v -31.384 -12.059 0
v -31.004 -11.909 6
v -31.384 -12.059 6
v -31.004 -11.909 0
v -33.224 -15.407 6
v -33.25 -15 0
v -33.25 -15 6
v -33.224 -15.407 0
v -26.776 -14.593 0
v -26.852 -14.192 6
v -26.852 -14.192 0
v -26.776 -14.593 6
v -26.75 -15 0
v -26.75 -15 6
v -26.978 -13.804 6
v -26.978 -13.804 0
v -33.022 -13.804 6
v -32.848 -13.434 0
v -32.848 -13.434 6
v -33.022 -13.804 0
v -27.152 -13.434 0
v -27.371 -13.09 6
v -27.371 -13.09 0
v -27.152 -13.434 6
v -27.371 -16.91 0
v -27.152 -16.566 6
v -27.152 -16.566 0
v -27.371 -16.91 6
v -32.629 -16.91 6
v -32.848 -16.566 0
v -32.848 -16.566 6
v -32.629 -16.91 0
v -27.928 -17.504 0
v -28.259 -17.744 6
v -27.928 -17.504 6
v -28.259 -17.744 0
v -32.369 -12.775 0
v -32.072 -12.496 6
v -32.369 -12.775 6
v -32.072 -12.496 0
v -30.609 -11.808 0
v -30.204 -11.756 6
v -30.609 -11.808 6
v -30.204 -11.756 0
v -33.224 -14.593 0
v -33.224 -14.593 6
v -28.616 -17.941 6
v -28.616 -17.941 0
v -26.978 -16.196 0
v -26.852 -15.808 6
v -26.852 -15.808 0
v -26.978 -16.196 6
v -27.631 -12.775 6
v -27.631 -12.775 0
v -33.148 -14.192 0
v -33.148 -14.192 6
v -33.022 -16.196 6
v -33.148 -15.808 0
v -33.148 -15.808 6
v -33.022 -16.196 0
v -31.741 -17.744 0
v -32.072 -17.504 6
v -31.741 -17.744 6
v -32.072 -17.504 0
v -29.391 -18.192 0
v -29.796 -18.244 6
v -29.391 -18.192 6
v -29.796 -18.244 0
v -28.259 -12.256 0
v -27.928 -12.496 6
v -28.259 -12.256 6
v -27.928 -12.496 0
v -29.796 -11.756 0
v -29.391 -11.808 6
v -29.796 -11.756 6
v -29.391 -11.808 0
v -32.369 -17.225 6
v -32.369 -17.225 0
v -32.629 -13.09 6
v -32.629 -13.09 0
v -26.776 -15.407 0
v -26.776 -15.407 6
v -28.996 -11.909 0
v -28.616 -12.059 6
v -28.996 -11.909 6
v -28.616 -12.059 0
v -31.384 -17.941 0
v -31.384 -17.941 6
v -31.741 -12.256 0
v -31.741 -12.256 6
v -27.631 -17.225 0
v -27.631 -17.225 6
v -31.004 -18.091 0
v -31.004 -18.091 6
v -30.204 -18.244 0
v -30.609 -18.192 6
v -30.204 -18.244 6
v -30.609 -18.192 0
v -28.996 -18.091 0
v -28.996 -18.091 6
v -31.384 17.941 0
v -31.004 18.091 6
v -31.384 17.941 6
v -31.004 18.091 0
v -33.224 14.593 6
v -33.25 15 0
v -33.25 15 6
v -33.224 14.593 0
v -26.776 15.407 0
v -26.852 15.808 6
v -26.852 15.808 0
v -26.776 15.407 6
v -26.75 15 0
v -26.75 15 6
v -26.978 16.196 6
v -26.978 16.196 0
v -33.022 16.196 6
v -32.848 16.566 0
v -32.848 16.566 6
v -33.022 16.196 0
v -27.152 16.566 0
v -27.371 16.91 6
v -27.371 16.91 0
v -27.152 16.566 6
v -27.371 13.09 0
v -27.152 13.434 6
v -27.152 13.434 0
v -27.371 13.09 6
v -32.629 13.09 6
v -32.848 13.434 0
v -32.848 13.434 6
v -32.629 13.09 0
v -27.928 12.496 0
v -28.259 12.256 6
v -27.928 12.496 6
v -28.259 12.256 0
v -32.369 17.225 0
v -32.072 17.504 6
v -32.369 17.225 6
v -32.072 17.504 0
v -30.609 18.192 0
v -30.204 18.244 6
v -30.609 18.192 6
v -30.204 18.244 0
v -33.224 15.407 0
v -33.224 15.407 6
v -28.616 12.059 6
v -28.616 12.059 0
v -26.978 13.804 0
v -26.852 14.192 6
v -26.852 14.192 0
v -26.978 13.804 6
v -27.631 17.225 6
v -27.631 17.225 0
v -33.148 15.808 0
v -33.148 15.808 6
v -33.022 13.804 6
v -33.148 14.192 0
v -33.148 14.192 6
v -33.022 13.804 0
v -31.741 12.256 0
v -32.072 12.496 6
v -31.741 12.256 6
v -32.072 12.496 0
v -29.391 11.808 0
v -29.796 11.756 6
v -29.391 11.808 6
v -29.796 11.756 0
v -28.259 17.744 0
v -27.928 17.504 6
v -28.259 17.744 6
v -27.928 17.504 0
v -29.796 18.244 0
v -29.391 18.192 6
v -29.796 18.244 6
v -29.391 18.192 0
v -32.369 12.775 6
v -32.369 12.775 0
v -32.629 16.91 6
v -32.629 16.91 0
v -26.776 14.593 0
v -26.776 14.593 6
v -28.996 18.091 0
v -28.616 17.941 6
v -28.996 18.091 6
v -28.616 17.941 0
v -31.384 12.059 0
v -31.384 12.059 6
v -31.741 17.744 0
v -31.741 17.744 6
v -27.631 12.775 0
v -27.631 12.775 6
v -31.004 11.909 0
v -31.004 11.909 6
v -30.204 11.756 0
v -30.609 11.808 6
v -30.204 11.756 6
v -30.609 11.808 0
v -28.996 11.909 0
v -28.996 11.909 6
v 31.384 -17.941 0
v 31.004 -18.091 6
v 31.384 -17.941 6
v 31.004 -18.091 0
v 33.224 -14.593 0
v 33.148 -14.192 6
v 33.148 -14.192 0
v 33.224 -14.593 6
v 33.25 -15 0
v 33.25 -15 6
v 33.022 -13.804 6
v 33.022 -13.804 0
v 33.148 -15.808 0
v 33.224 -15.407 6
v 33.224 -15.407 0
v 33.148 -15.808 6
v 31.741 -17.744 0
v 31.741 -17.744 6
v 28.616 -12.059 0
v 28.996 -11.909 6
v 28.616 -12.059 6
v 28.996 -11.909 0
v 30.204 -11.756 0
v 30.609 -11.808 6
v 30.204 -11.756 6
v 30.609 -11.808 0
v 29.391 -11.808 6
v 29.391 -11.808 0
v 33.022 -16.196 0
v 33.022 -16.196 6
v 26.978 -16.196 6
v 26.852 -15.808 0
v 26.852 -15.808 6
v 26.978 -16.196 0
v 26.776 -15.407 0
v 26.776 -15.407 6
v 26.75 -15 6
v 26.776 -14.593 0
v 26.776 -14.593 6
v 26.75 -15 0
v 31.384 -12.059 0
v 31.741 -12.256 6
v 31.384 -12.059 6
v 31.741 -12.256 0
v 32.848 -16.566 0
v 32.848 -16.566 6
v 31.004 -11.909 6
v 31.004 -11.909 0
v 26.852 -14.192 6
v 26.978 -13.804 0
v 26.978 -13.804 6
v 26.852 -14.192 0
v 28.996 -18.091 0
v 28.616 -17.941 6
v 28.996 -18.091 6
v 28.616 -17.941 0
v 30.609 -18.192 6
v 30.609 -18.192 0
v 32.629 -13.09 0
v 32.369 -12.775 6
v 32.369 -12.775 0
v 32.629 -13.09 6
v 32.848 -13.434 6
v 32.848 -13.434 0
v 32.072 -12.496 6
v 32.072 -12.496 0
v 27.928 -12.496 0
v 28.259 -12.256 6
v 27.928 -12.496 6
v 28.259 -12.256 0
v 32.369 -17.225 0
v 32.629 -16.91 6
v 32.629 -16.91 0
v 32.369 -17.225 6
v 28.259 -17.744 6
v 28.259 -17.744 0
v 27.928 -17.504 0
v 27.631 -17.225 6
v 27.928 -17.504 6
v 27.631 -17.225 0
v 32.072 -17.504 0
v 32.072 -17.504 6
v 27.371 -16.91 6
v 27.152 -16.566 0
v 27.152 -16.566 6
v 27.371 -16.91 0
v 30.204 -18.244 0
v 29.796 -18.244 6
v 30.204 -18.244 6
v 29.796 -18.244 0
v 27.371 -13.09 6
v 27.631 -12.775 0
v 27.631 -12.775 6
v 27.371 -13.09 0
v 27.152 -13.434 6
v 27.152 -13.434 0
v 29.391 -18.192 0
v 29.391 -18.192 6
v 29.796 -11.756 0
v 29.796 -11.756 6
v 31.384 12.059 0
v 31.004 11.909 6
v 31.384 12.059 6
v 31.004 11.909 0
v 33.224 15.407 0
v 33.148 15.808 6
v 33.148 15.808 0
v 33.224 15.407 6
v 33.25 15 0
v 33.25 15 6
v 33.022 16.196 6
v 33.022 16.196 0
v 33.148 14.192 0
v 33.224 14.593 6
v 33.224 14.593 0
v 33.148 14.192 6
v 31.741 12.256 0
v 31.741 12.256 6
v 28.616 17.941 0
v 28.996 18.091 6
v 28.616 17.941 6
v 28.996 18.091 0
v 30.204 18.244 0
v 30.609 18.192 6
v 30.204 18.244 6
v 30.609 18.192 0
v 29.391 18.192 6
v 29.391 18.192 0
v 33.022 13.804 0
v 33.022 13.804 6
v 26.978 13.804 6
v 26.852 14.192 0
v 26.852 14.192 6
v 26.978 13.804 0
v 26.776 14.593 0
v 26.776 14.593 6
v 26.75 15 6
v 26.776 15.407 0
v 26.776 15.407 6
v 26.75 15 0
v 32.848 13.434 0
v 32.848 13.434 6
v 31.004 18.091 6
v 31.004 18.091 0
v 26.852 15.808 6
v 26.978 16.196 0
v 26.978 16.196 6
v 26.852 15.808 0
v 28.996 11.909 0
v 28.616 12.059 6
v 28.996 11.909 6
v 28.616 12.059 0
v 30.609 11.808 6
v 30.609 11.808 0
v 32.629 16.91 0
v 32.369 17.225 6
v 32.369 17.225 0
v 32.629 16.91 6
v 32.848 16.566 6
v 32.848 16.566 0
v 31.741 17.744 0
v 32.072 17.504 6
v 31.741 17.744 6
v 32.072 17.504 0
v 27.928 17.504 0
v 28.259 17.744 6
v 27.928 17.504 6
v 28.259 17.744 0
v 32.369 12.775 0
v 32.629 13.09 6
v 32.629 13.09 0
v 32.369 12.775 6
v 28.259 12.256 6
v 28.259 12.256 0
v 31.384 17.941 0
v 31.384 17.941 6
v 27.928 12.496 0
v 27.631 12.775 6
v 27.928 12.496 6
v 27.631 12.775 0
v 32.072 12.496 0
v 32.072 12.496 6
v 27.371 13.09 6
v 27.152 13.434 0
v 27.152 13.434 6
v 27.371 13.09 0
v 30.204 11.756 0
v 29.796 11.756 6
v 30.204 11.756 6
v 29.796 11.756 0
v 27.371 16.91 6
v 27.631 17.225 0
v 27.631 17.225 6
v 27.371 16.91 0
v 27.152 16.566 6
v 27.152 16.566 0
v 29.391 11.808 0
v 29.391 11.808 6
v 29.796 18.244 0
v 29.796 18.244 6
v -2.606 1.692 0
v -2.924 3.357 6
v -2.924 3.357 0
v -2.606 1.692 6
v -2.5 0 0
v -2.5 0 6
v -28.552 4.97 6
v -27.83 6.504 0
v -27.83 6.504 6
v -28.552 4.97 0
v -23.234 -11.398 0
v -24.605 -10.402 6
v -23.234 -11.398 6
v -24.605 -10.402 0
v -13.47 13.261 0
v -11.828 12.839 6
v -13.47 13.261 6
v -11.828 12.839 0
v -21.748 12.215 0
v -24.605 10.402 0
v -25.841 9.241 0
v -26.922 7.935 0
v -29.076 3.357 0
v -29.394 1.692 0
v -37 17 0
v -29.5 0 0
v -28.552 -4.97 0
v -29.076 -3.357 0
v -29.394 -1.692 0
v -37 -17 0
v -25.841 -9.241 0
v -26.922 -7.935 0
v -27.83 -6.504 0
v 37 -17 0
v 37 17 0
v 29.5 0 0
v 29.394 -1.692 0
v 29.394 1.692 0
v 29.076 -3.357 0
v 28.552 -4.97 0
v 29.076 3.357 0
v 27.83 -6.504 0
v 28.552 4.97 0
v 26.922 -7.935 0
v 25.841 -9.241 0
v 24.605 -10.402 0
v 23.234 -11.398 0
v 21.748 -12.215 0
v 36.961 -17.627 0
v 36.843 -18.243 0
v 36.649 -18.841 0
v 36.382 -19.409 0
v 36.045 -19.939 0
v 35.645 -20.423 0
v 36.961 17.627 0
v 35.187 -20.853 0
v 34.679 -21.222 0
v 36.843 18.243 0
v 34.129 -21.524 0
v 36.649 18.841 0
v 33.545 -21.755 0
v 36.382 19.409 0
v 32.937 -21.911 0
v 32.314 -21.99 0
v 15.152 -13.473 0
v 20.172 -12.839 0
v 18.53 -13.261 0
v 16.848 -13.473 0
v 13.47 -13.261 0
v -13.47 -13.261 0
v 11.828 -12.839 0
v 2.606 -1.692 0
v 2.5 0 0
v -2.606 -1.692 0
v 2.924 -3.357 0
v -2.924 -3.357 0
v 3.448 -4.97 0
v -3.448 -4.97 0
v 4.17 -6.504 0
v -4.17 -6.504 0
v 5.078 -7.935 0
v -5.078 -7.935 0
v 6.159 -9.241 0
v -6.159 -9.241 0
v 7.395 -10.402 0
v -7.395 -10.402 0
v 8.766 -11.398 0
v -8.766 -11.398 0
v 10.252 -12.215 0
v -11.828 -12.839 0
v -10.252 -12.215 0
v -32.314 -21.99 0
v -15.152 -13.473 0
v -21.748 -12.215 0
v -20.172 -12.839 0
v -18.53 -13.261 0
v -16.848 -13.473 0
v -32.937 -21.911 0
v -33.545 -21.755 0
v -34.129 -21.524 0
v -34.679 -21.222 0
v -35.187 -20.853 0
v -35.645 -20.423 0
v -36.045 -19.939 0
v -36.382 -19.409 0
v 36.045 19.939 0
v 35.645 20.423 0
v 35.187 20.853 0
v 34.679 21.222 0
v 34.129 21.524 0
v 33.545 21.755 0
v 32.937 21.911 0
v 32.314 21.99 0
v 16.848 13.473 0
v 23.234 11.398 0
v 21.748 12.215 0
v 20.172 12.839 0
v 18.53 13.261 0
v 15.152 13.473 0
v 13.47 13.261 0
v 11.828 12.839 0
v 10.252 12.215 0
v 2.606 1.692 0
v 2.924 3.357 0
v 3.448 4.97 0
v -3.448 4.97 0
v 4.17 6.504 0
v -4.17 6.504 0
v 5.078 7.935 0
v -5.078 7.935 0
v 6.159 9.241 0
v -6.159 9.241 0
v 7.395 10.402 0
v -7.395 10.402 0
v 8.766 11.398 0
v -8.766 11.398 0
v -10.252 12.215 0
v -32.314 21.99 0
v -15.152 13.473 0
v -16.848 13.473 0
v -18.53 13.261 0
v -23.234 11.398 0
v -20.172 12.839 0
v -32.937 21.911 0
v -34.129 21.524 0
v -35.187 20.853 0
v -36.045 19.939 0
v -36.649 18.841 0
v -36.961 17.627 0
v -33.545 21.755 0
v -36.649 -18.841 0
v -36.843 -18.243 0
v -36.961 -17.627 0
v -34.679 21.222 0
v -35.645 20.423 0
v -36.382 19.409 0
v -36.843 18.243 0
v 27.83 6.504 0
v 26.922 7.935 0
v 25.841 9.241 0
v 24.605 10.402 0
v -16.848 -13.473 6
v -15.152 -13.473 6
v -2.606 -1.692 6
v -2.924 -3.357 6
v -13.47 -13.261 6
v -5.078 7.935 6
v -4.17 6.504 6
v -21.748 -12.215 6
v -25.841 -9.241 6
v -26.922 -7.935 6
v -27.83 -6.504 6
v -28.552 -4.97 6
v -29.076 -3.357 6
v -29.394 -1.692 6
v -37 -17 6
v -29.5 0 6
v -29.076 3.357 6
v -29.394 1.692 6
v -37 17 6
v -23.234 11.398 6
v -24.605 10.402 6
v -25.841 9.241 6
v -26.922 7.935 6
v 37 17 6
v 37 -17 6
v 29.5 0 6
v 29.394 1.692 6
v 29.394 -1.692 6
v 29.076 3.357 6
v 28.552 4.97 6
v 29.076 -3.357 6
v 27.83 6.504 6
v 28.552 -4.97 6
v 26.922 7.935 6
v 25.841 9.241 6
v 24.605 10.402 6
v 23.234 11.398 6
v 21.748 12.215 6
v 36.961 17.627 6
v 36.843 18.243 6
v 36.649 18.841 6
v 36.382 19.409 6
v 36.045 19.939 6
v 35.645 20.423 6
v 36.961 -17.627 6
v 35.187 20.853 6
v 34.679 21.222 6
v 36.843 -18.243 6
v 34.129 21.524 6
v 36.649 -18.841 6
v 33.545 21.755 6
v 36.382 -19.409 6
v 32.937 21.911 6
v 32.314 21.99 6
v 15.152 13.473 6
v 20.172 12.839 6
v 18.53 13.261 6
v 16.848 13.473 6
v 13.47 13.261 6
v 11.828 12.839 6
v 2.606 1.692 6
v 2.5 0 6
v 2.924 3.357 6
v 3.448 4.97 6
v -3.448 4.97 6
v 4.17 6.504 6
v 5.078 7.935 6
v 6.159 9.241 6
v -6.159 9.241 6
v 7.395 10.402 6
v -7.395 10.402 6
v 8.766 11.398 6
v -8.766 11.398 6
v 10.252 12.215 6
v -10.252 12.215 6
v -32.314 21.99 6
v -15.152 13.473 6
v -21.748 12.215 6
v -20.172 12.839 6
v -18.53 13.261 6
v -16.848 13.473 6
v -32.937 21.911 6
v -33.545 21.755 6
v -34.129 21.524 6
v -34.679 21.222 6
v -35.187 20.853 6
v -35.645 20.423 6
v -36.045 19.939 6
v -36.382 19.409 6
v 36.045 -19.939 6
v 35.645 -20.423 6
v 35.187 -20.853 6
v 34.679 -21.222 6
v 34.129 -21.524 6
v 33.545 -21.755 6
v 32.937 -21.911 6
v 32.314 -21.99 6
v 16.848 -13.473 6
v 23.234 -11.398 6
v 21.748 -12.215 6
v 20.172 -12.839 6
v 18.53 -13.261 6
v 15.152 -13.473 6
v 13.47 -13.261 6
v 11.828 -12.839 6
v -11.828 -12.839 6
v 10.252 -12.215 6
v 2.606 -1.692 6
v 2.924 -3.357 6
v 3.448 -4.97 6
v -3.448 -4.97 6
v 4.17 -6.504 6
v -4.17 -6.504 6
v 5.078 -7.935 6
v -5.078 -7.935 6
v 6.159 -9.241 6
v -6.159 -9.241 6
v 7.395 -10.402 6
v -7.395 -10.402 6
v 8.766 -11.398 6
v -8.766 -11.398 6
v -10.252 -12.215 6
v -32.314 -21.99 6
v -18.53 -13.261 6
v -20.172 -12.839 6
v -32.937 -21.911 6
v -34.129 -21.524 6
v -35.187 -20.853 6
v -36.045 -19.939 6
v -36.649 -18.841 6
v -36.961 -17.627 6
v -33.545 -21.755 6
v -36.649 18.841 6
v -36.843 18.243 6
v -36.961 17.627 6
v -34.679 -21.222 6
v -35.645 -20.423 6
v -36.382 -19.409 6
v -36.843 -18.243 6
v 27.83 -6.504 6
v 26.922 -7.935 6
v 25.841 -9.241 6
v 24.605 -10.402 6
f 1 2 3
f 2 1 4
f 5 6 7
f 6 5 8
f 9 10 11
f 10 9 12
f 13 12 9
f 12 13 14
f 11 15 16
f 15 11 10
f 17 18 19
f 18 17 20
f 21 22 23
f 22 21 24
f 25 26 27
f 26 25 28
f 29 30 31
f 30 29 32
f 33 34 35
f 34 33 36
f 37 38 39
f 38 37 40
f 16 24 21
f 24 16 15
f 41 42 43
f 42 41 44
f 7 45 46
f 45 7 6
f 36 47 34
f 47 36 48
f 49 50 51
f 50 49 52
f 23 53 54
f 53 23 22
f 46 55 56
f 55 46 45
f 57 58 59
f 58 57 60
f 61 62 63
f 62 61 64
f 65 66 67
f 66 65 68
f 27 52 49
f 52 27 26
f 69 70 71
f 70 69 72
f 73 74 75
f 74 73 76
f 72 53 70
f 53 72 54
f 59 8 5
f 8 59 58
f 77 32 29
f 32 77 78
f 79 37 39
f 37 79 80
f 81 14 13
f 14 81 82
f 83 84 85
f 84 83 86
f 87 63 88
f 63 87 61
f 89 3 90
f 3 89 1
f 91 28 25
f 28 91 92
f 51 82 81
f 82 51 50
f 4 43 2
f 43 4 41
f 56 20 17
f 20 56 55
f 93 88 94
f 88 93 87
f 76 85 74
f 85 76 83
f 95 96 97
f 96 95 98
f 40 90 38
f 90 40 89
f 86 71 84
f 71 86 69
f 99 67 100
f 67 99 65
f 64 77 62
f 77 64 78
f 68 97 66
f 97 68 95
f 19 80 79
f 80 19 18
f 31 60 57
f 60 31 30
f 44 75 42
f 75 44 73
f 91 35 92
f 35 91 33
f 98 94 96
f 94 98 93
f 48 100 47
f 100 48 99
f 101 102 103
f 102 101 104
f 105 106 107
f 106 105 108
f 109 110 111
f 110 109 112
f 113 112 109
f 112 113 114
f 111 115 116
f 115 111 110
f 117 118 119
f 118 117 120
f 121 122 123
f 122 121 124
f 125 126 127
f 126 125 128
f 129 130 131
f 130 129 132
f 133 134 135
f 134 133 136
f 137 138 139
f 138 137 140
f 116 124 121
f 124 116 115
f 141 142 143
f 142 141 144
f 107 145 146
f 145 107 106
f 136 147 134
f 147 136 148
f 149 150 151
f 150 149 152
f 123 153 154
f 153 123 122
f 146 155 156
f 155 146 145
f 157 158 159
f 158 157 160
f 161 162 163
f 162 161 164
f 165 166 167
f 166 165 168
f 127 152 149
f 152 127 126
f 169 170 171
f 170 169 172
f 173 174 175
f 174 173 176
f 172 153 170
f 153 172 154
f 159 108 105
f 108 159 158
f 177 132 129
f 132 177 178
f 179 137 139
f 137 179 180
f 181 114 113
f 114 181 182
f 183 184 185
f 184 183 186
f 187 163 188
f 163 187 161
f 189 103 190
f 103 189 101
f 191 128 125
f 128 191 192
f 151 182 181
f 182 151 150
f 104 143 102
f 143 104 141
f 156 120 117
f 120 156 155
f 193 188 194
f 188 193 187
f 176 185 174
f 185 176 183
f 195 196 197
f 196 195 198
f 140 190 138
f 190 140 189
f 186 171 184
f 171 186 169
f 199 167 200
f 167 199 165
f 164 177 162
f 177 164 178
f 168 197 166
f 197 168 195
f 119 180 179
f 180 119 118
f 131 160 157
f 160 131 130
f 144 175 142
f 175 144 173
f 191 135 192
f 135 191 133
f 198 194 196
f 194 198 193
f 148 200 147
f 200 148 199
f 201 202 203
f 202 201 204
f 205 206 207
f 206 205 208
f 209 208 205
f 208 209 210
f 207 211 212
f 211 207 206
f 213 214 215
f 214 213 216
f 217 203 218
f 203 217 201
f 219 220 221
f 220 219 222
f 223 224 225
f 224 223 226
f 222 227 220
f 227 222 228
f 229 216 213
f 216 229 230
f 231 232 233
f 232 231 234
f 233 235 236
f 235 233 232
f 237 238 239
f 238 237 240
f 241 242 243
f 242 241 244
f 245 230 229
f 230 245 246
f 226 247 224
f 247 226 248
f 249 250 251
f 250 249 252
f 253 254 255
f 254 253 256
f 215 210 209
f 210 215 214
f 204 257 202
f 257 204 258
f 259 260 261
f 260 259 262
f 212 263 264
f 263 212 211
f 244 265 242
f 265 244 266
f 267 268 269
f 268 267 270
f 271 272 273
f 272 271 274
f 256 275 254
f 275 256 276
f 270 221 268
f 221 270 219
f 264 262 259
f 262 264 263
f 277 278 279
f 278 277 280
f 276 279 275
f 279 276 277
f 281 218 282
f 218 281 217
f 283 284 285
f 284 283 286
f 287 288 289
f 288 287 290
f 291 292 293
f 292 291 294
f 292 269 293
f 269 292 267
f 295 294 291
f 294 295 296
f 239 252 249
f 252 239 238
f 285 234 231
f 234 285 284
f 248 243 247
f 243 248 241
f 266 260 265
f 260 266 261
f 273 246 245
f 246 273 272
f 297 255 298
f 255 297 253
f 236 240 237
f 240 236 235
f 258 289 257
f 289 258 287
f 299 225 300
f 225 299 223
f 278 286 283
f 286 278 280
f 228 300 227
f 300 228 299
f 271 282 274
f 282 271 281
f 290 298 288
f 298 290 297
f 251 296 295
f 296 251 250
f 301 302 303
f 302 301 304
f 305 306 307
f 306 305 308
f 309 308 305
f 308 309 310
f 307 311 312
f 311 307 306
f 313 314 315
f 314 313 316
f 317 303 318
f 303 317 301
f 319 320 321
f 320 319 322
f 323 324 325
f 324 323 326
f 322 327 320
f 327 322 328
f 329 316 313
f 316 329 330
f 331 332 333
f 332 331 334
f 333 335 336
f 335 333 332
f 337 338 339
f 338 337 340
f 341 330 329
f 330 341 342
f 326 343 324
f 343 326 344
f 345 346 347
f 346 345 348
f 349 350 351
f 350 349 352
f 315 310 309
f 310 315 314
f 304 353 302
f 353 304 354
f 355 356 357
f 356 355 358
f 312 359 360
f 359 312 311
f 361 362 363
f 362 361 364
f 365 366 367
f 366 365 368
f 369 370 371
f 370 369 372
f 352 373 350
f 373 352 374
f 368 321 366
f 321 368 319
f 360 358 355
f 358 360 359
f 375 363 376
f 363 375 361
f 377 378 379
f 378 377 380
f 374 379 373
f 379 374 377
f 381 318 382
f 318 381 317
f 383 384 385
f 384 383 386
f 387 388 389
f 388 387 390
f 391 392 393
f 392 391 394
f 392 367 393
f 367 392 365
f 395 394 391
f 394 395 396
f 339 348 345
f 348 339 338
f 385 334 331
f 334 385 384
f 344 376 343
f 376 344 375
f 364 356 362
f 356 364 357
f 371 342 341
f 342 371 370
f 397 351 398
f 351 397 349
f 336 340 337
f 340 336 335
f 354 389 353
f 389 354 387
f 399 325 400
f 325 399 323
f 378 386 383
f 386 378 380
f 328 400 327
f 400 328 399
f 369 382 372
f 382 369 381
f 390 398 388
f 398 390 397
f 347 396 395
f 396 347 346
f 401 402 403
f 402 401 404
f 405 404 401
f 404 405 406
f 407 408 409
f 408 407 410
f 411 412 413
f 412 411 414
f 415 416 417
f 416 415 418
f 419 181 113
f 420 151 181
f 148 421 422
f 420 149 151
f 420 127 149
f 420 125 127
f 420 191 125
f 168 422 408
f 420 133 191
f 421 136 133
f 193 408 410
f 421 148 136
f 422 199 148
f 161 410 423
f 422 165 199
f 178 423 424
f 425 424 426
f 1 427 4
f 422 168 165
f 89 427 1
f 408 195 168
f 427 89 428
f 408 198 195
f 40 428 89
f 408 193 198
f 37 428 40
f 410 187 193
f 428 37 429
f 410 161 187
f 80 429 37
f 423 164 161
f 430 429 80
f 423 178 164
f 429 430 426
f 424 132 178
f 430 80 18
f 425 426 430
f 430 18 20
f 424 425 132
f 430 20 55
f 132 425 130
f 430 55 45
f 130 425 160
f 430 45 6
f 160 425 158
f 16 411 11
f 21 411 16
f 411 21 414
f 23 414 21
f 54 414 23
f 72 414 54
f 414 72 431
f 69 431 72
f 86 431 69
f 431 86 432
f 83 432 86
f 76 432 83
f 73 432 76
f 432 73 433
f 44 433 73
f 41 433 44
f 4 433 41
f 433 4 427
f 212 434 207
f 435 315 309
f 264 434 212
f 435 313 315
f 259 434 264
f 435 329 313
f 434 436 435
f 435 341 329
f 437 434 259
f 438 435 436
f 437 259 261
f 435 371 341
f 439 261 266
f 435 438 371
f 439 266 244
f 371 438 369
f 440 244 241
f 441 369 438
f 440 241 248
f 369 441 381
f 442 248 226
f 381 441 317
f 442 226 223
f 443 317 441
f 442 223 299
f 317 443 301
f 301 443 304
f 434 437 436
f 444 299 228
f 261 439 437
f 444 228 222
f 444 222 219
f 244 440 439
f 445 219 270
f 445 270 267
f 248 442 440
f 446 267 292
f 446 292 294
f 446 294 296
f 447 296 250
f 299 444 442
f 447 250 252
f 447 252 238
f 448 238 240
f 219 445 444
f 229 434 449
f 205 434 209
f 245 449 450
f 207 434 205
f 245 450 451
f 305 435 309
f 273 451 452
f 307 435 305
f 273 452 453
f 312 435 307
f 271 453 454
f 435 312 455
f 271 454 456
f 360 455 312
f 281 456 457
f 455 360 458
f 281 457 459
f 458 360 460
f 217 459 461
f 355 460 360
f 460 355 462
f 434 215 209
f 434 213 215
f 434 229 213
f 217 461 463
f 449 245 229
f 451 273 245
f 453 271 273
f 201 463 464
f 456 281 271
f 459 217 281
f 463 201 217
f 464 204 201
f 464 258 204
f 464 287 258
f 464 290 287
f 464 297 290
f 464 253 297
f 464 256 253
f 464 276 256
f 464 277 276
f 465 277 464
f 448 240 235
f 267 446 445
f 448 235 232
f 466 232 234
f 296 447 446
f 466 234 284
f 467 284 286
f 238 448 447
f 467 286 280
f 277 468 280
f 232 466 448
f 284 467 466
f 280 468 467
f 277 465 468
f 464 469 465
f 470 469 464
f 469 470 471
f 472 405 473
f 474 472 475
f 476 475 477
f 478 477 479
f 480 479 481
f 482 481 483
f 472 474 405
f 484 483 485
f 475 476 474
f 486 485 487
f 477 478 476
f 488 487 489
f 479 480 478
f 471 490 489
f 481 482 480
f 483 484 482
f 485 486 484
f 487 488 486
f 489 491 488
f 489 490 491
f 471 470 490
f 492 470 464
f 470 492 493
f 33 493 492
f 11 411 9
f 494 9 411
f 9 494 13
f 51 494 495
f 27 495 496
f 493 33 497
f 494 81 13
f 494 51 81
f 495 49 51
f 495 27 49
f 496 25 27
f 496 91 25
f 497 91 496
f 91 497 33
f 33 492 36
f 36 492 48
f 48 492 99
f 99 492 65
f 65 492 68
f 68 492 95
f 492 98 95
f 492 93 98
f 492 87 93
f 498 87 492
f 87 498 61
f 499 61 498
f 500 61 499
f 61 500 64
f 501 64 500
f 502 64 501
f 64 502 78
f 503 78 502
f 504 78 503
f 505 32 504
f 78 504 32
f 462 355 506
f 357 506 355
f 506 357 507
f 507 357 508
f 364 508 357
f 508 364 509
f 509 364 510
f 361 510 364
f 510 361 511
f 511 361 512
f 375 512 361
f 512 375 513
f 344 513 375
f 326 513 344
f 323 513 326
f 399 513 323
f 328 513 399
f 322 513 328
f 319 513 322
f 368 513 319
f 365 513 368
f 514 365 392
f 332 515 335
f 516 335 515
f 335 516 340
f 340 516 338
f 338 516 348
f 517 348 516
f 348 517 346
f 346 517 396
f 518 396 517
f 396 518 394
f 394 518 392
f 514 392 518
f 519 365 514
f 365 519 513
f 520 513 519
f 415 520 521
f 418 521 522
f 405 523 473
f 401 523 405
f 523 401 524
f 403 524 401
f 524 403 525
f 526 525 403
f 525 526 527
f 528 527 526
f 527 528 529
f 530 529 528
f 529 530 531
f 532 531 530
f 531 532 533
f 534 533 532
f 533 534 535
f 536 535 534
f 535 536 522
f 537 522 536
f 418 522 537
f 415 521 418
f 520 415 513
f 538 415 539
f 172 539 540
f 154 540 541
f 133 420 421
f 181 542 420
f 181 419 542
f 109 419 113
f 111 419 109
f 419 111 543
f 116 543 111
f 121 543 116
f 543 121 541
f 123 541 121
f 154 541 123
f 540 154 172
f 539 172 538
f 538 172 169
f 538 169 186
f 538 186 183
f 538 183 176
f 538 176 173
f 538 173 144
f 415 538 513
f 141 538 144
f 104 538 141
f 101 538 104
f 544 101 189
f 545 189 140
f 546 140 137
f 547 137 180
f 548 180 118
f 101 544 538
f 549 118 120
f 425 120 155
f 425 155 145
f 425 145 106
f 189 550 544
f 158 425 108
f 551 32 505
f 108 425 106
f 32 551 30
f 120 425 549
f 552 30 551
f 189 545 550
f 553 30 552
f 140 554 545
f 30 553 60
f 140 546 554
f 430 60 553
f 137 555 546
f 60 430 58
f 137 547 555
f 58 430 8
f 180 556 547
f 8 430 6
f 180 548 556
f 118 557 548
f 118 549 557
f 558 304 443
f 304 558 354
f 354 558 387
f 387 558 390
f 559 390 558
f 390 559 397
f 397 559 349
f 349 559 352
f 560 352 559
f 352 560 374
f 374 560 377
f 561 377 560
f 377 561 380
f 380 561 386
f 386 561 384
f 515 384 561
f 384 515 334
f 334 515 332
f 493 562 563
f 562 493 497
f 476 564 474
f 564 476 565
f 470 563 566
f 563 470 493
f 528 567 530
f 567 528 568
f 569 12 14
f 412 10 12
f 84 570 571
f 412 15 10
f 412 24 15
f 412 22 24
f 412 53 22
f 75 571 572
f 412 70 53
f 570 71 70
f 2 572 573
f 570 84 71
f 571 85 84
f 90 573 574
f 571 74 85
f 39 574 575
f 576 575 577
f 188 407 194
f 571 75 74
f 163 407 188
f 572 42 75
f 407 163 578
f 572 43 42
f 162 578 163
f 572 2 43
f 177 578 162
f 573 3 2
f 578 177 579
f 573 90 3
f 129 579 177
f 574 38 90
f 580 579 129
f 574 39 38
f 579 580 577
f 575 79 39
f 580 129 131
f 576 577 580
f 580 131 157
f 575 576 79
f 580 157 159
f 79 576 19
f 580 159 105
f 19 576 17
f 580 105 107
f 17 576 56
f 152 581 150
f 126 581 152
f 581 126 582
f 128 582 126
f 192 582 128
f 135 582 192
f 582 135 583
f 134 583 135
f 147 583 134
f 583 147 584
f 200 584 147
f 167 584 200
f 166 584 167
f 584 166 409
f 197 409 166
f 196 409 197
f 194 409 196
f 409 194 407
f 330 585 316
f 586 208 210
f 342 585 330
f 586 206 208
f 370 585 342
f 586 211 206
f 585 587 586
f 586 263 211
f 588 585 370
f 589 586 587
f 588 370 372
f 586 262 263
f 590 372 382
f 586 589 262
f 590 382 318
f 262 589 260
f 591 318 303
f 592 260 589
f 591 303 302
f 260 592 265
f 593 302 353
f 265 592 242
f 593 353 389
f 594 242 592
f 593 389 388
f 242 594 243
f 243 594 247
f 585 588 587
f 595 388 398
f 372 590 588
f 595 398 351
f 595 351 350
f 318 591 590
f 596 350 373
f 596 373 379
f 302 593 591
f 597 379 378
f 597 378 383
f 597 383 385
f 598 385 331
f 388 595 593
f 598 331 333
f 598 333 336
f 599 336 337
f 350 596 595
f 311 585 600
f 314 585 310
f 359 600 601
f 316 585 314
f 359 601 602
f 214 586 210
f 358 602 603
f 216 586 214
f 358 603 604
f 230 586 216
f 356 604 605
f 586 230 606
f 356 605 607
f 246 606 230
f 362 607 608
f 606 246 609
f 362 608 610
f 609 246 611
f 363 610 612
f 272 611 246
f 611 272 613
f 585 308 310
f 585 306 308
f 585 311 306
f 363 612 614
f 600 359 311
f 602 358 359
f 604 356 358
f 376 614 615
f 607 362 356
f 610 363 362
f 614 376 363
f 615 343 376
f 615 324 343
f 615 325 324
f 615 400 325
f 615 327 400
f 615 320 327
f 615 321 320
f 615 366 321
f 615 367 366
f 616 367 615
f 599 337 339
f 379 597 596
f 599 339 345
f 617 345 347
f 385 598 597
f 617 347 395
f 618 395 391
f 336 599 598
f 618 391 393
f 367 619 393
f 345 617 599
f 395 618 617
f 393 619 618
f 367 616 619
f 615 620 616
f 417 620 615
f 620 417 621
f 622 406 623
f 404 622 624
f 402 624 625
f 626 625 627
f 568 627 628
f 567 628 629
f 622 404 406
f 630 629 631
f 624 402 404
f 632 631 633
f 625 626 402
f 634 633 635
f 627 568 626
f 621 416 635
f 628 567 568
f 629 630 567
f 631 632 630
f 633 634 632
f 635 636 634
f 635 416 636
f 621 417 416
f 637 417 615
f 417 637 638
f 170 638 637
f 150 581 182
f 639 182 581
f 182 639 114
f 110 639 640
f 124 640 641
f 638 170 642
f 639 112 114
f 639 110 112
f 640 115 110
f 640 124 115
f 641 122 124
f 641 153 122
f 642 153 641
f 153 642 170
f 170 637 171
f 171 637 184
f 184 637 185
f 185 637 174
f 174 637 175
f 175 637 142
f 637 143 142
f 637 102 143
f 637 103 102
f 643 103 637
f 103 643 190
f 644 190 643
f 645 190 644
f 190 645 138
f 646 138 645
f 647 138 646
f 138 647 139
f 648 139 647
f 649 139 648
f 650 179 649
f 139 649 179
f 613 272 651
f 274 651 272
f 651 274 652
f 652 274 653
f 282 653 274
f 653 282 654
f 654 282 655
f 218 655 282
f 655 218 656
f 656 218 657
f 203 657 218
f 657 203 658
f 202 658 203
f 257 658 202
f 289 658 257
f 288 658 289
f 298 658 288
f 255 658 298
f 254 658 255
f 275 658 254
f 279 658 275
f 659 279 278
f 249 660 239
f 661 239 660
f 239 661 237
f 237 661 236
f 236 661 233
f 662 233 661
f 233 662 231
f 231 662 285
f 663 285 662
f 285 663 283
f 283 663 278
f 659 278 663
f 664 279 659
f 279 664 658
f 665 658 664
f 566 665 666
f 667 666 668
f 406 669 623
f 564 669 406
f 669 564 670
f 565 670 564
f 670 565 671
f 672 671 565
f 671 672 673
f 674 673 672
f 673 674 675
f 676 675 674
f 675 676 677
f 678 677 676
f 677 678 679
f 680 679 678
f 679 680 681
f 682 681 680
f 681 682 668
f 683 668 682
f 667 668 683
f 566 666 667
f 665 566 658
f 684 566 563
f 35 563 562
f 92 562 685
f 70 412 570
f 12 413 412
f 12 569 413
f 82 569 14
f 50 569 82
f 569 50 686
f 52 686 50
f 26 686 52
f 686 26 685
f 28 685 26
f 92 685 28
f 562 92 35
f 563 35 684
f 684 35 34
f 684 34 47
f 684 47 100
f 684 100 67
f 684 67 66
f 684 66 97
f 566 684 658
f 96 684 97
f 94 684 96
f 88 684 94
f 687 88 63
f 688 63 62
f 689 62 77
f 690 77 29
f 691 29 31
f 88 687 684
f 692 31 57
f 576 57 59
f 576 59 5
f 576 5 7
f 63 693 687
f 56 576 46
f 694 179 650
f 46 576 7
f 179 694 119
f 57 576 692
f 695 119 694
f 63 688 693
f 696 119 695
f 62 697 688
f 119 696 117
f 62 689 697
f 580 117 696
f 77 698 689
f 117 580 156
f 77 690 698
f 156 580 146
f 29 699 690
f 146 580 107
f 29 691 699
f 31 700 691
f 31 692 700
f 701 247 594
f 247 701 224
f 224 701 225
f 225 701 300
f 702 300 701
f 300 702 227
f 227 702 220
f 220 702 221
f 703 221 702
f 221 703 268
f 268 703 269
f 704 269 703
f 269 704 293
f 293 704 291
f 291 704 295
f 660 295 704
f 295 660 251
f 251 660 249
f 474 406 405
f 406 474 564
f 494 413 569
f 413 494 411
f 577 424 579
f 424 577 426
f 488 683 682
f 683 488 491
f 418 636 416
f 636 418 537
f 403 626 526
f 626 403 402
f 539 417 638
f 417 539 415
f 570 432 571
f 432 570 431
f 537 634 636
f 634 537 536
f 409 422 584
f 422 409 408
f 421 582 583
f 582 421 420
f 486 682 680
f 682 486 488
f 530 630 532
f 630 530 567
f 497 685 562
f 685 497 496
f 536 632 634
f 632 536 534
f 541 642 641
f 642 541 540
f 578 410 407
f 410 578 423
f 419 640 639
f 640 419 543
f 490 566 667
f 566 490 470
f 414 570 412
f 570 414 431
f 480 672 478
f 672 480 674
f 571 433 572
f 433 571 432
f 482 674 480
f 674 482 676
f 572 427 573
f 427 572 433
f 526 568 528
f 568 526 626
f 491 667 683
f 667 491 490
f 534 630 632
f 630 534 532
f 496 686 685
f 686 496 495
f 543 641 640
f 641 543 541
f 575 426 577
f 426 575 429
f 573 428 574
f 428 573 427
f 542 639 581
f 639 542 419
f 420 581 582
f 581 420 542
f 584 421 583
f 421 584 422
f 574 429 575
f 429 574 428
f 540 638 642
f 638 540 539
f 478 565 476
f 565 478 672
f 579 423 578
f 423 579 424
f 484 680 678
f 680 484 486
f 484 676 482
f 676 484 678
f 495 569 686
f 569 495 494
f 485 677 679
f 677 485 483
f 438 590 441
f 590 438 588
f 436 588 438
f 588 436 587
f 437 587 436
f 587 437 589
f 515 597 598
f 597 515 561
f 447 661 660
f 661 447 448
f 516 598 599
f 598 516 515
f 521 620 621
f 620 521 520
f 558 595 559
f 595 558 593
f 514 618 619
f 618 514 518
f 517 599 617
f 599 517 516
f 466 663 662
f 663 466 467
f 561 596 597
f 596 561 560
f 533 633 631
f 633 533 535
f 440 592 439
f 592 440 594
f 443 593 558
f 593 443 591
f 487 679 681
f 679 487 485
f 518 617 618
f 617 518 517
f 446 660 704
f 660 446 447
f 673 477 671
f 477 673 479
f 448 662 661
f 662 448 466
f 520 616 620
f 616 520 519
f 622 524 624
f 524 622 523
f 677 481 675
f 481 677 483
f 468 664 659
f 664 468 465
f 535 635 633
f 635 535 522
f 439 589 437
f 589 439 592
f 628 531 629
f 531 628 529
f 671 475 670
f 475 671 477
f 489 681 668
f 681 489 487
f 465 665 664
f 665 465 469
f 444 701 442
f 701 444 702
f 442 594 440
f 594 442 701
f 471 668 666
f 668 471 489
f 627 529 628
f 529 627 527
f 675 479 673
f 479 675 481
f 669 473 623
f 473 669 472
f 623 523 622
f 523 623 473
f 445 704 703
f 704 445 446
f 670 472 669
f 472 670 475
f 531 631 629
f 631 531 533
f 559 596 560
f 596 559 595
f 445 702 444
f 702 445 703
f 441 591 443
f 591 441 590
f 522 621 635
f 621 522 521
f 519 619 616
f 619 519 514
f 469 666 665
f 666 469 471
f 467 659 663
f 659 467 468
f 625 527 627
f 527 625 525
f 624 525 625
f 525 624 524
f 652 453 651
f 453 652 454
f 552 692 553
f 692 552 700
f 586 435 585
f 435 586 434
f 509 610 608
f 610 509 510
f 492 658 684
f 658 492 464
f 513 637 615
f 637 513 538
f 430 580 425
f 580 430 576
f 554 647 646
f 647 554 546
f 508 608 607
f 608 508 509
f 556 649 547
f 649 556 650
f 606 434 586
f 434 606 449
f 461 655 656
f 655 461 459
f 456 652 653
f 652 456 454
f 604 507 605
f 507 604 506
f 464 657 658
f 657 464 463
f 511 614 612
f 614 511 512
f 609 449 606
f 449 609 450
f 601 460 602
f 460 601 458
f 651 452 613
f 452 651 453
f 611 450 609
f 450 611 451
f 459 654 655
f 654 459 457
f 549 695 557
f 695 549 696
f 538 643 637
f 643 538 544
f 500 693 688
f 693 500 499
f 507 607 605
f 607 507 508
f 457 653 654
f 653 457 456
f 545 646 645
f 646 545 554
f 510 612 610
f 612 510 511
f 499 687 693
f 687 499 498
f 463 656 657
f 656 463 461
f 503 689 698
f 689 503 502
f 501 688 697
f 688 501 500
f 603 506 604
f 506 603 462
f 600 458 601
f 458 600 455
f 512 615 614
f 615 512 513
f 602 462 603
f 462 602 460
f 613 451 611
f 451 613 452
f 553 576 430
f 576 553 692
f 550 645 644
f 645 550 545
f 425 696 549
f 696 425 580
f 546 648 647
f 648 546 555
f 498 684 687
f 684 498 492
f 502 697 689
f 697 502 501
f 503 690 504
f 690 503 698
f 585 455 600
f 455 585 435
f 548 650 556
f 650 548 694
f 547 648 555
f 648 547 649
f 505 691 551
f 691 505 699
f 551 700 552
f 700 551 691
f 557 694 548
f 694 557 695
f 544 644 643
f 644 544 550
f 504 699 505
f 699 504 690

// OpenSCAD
$fn = 50;


difference() {
	union() {
		hull() {
			translate(v = [-32.0000000000, 17.0000000000, 0]) {
				cylinder(h = 6, r = 5);
			}
			translate(v = [32.0000000000, 17.0000000000, 0]) {
				cylinder(h = 6, r = 5);
			}
			translate(v = [-32.0000000000, -17.0000000000, 0]) {
				cylinder(h = 6, r = 5);
			}
			translate(v = [32.0000000000, -17.0000000000, 0]) {
				cylinder(h = 6, r = 5);
			}
		}
	}
	union() {
		#translate(v = [-30.0000000000, -15.0000000000, -100.0000000000]) {
			cylinder(h = 200, r = 3.2500000000);
		}
		#translate(v = [-30.0000000000, 15.0000000000, -100.0000000000]) {
			cylinder(h = 200, r = 3.2500000000);
		}
		#translate(v = [30.0000000000, -15.0000000000, -100.0000000000]) {
			cylinder(h = 200, r = 3.2500000000);
		}
		#translate(v = [30.0000000000, 15.0000000000, -100.0000000000]) {
			cylinder(h = 200, r = 3.2500000000);
		}
		#translate(v = [-16.0000000000, 0, 0]) {
			cylinder(h = 6, r = 13.5000000000);
		}
		#translate(v = [16.0000000000, 0, 0]) {
			cylinder(h = 6, r = 13.5000000000);
		}
	}
}
